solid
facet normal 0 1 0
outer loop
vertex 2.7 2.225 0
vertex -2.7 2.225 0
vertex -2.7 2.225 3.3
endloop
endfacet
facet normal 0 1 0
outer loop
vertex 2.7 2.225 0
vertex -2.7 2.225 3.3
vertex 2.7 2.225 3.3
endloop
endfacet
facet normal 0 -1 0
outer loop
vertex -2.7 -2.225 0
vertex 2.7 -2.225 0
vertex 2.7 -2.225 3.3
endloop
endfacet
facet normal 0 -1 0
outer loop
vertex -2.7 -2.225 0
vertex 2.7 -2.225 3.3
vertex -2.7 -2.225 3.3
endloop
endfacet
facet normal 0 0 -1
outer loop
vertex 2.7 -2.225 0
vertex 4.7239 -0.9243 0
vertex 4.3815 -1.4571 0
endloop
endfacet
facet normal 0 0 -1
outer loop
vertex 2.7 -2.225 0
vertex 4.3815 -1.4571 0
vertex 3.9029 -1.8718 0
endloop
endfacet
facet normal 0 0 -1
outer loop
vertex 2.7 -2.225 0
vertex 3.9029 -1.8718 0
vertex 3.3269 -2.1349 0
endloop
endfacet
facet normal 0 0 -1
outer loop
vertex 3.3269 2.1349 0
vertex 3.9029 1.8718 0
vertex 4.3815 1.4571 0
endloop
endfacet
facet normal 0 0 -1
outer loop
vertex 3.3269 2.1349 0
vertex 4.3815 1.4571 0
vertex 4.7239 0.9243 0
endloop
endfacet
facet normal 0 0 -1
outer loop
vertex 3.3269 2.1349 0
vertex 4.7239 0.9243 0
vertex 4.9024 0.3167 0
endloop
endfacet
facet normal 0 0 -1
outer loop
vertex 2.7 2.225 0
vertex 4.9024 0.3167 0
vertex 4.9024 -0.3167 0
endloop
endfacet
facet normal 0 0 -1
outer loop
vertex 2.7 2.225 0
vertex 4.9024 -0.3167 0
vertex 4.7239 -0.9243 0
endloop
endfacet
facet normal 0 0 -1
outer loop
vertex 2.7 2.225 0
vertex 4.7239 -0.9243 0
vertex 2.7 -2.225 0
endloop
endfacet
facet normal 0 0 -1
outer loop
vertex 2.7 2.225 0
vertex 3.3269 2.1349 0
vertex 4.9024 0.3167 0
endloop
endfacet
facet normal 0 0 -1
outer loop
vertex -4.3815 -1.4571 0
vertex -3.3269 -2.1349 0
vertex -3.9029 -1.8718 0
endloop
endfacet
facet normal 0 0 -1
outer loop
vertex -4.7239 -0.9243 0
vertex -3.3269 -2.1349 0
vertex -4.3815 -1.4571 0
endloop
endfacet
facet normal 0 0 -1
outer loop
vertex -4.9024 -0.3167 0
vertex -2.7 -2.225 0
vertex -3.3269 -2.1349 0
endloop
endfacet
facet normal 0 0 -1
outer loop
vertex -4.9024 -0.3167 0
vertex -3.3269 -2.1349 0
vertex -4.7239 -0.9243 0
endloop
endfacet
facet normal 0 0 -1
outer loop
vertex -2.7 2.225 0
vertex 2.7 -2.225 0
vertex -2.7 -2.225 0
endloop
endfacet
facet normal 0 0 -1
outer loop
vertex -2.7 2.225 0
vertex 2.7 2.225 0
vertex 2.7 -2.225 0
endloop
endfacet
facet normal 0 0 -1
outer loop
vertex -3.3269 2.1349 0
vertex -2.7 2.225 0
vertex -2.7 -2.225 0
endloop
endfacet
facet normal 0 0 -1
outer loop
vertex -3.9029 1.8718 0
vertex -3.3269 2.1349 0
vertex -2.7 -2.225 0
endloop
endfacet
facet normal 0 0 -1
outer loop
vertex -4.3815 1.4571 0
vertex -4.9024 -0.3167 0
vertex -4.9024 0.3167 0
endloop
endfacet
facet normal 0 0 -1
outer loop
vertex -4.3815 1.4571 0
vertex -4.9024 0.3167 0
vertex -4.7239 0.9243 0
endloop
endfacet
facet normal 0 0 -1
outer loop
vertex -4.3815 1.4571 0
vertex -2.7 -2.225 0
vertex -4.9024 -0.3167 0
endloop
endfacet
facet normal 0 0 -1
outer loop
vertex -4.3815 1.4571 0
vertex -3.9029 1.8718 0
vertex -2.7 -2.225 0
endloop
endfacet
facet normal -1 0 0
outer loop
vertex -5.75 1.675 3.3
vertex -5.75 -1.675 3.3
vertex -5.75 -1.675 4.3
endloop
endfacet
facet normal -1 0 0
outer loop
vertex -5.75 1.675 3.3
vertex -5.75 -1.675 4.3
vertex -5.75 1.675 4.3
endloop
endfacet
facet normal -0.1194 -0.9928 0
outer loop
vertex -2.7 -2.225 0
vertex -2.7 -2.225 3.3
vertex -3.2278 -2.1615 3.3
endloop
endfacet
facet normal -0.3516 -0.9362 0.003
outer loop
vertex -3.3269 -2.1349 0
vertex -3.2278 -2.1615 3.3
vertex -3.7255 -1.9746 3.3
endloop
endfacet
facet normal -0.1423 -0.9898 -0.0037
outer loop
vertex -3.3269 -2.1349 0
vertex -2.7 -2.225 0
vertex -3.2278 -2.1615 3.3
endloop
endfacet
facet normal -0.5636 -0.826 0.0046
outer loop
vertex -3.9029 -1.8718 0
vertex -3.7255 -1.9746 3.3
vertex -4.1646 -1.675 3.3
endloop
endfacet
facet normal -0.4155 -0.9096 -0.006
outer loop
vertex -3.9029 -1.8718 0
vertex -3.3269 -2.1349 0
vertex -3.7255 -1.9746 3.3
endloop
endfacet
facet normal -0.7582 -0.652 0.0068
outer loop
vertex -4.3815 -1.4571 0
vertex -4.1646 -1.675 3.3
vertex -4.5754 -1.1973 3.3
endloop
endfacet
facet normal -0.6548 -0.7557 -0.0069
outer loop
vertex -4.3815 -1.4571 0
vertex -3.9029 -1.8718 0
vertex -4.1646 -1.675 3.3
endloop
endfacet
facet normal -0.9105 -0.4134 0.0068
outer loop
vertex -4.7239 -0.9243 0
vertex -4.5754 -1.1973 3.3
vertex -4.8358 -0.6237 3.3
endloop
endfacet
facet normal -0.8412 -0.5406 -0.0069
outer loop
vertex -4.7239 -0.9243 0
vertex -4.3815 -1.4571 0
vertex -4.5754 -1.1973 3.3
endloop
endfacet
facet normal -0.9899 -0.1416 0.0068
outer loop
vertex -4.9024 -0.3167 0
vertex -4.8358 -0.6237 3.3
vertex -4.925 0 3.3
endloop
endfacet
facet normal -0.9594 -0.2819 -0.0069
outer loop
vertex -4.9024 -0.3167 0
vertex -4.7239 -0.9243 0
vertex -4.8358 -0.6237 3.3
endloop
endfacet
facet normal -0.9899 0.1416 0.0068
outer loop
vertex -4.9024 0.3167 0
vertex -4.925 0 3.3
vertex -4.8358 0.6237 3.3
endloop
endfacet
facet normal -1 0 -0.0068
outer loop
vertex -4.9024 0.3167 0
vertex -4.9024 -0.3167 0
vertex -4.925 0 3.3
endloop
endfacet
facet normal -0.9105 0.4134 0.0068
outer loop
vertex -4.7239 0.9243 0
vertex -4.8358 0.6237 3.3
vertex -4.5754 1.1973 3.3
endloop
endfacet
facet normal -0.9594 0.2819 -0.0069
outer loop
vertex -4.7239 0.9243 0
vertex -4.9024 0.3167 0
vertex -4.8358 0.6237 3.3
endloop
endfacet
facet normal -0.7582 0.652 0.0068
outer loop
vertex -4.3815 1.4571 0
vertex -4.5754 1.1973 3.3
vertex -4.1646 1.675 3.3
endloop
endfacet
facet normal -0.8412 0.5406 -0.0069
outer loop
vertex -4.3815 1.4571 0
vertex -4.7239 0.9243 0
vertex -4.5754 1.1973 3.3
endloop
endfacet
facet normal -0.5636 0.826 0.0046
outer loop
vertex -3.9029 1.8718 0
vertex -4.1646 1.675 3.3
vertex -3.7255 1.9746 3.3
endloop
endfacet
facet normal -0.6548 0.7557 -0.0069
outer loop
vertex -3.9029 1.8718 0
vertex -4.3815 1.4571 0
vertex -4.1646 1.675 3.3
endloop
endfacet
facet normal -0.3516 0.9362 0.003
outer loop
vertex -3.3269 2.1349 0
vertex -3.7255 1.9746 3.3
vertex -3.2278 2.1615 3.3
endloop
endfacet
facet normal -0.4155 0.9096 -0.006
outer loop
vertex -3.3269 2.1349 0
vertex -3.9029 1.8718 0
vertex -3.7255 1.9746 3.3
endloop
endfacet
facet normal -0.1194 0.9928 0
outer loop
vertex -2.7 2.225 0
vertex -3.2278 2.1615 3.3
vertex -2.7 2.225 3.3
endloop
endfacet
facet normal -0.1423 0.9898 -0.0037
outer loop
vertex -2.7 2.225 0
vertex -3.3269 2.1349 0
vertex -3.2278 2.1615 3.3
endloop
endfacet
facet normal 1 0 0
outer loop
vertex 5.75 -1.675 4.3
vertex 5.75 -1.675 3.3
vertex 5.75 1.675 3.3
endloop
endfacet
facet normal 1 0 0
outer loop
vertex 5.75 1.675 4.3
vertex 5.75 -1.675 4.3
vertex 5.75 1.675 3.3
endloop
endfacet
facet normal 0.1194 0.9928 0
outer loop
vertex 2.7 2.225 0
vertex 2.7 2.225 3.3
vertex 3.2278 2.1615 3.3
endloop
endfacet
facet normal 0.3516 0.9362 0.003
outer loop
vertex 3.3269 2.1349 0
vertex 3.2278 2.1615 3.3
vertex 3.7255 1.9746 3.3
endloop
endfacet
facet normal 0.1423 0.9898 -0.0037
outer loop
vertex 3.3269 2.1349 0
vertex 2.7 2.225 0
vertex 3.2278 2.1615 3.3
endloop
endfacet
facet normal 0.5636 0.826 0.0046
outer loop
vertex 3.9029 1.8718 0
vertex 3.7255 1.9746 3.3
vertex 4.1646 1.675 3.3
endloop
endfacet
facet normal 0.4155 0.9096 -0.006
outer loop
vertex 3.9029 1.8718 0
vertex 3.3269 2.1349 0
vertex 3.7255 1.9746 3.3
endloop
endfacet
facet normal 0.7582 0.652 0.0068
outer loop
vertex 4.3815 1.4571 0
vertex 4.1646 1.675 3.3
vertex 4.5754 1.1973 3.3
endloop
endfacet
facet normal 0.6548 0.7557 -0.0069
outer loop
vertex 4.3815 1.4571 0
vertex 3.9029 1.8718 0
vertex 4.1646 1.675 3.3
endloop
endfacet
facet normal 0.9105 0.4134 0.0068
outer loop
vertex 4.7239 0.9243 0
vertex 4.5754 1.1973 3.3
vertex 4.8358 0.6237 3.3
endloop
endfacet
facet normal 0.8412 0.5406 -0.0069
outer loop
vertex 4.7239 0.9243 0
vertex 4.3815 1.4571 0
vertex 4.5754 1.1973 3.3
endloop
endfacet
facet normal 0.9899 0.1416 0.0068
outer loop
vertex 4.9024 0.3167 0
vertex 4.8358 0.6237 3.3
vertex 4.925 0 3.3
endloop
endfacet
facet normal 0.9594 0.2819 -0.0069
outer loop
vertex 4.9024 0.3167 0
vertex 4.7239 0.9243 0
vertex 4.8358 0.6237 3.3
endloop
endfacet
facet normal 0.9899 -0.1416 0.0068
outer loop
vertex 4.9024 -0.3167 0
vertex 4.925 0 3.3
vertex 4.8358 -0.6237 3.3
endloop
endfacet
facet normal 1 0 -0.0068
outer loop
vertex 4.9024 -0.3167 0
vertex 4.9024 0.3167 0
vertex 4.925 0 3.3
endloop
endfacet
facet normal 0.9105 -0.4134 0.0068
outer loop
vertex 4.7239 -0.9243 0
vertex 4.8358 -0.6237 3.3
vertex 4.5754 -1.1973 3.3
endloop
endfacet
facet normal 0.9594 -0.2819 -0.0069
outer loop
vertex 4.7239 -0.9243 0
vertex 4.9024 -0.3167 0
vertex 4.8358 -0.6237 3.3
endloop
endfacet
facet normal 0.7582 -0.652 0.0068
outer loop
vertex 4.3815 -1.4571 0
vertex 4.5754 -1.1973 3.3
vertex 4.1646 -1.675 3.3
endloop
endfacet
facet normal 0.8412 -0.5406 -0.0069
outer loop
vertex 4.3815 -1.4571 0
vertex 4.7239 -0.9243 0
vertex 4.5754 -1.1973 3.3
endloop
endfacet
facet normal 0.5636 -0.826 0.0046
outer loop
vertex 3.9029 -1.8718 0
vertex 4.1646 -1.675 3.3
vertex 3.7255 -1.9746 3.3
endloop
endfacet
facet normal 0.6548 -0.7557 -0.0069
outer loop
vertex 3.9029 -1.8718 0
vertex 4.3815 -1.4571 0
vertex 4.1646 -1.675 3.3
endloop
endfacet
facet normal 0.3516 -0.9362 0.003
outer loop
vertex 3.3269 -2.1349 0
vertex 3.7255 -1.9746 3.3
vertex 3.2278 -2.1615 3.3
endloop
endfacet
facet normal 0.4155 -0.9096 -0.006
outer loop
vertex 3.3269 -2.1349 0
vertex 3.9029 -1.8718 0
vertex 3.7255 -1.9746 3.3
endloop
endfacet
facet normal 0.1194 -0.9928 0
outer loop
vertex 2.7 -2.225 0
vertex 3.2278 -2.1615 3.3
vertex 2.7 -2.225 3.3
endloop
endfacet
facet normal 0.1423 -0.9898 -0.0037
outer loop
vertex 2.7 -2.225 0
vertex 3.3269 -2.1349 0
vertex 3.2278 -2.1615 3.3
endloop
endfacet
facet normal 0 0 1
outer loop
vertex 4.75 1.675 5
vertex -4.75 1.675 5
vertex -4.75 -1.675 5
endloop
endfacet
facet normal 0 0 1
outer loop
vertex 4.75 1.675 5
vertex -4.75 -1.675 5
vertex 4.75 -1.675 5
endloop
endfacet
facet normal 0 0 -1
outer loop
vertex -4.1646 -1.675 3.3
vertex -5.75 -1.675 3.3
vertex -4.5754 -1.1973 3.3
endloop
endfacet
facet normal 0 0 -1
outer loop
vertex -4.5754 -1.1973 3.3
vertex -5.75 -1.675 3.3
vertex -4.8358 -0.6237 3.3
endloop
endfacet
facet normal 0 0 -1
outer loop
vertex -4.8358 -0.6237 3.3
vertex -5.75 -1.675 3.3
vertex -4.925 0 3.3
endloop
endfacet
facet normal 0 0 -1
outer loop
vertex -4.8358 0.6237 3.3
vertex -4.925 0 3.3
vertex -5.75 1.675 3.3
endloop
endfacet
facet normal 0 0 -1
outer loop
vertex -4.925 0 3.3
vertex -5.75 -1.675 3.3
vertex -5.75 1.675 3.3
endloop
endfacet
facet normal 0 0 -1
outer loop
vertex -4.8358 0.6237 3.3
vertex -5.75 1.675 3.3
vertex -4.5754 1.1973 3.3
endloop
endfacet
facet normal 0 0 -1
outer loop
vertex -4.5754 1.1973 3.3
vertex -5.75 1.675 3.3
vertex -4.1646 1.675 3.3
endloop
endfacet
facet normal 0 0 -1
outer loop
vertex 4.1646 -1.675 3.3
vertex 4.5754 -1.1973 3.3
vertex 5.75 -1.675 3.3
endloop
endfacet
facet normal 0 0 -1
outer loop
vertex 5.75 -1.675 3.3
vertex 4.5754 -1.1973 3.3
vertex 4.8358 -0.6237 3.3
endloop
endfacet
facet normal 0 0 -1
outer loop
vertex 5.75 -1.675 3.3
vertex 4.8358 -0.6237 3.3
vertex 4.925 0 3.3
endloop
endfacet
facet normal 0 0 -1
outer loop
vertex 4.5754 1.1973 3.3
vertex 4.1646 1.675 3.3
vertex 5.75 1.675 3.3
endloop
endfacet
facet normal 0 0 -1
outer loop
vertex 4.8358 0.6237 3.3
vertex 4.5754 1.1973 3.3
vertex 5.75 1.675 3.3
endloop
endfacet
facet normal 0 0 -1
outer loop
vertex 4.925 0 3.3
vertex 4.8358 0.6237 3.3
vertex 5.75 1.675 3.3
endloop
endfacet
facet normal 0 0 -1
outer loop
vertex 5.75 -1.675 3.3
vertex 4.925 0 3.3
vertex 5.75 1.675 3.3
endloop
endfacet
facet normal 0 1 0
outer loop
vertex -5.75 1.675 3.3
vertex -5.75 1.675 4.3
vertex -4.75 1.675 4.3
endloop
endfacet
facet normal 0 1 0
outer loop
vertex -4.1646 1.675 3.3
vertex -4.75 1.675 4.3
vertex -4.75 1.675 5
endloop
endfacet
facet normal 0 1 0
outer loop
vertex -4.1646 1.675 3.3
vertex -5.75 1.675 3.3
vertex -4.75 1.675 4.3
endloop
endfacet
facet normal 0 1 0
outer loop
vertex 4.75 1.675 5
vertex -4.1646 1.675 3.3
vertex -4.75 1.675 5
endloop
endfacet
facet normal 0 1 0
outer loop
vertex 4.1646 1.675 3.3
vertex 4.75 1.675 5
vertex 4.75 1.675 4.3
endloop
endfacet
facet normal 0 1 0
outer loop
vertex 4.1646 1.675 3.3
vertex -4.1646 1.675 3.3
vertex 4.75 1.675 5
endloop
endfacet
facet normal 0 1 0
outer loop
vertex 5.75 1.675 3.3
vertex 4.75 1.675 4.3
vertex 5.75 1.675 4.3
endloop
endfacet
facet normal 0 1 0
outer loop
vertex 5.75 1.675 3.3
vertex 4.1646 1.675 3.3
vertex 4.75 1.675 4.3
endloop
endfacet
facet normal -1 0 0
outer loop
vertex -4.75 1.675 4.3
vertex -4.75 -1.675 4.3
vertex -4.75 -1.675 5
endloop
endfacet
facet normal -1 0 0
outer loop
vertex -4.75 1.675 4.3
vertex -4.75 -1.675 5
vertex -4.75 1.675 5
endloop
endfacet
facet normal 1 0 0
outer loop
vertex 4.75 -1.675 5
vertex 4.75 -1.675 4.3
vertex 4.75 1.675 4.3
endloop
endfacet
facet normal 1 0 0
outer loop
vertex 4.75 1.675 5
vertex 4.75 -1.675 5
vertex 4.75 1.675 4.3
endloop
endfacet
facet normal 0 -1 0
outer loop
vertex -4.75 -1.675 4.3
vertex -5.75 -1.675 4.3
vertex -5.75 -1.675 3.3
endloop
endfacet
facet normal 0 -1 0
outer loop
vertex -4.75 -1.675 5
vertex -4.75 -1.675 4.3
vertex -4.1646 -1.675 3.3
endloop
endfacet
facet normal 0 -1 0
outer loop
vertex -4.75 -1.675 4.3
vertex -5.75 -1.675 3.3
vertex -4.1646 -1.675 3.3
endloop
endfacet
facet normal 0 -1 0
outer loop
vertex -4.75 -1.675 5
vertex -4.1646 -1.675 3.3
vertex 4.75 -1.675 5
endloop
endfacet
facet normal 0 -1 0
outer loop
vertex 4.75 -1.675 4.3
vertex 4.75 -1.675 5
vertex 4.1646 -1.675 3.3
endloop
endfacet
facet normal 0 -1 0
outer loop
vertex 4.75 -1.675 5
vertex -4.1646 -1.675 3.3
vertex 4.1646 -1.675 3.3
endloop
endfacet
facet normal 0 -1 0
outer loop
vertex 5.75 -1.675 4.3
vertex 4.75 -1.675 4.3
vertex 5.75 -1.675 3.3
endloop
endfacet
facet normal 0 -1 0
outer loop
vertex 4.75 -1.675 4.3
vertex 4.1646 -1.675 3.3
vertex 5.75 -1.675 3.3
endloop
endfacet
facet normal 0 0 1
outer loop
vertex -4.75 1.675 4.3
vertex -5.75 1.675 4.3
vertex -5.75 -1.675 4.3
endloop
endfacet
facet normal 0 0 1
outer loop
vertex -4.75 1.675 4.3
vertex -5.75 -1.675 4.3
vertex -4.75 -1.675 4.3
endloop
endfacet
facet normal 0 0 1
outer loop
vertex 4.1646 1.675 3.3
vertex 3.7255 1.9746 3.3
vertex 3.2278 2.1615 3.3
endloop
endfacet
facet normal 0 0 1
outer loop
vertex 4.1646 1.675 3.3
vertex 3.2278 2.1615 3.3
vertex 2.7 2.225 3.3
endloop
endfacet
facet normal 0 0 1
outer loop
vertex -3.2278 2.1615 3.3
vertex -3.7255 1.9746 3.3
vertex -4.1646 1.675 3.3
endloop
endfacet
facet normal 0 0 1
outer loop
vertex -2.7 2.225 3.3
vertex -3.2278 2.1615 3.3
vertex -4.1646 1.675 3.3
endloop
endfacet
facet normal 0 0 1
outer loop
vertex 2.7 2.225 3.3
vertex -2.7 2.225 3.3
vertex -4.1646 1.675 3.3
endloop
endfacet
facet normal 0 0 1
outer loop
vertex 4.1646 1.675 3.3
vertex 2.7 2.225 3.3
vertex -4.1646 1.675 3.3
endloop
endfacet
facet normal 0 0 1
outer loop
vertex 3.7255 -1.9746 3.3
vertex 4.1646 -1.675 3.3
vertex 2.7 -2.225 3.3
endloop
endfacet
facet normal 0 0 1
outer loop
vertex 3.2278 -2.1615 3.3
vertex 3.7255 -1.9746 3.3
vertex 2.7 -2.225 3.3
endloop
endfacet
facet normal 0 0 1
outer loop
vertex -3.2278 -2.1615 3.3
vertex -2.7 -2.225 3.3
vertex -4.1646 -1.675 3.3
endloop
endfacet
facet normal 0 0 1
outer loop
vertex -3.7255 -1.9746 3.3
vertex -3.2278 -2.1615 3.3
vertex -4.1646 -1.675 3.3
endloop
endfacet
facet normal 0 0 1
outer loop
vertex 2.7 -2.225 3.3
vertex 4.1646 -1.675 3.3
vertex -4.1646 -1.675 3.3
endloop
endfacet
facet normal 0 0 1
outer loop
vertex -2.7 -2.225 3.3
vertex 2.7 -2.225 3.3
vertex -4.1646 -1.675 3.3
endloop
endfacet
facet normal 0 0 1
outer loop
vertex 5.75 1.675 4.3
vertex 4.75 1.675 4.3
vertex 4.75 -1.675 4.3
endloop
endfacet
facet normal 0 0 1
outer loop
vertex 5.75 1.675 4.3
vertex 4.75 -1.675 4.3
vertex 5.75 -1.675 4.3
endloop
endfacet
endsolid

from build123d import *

# Parameters (mm, degrees)
BOSS_EXTRU_1_DEPTH = 3.3
ESQUISSE4_W        = 11.5
ESQUISSE4_H        = 3.35
BOSS_EXTRU_2_DEPTH = 1
ESQUISSE5_W        = 9.5
ESQUISSE5_H        = 3.35
BOSS_EXTRU_3_DEPTH = 0.7


with BuildPart() as part:
    # Esquisse3 → Boss.-Extru.1 (new body)
    with BuildSketch(Plane.XY):
        with BuildLine():
            Line((-2.7, 2.225), (2.7, 2.225))
            ThreePointArc((2.7, 2.225), (4.925, 0), (2.7, -2.225))
            Line((2.7, -2.225), (-2.7, -2.225))
            ThreePointArc((-2.7, -2.225), (-4.925, 0), (-2.7, 2.225))
        make_face()
    extrude(amount=BOSS_EXTRU_1_DEPTH)

    # Esquisse4 → Boss.-Extru.2 (add)
    with BuildSketch(Plane.XY.offset(3.3)):
        Rectangle(ESQUISSE4_W, ESQUISSE4_H)
    extrude(amount=BOSS_EXTRU_2_DEPTH)

    # Esquisse5 → Boss.-Extru.3 (add)
    with BuildSketch(Plane.XY.offset(4.3)):
        Rectangle(ESQUISSE5_W, ESQUISSE5_H)
    extrude(amount=BOSS_EXTRU_3_DEPTH)


solid = part.part
